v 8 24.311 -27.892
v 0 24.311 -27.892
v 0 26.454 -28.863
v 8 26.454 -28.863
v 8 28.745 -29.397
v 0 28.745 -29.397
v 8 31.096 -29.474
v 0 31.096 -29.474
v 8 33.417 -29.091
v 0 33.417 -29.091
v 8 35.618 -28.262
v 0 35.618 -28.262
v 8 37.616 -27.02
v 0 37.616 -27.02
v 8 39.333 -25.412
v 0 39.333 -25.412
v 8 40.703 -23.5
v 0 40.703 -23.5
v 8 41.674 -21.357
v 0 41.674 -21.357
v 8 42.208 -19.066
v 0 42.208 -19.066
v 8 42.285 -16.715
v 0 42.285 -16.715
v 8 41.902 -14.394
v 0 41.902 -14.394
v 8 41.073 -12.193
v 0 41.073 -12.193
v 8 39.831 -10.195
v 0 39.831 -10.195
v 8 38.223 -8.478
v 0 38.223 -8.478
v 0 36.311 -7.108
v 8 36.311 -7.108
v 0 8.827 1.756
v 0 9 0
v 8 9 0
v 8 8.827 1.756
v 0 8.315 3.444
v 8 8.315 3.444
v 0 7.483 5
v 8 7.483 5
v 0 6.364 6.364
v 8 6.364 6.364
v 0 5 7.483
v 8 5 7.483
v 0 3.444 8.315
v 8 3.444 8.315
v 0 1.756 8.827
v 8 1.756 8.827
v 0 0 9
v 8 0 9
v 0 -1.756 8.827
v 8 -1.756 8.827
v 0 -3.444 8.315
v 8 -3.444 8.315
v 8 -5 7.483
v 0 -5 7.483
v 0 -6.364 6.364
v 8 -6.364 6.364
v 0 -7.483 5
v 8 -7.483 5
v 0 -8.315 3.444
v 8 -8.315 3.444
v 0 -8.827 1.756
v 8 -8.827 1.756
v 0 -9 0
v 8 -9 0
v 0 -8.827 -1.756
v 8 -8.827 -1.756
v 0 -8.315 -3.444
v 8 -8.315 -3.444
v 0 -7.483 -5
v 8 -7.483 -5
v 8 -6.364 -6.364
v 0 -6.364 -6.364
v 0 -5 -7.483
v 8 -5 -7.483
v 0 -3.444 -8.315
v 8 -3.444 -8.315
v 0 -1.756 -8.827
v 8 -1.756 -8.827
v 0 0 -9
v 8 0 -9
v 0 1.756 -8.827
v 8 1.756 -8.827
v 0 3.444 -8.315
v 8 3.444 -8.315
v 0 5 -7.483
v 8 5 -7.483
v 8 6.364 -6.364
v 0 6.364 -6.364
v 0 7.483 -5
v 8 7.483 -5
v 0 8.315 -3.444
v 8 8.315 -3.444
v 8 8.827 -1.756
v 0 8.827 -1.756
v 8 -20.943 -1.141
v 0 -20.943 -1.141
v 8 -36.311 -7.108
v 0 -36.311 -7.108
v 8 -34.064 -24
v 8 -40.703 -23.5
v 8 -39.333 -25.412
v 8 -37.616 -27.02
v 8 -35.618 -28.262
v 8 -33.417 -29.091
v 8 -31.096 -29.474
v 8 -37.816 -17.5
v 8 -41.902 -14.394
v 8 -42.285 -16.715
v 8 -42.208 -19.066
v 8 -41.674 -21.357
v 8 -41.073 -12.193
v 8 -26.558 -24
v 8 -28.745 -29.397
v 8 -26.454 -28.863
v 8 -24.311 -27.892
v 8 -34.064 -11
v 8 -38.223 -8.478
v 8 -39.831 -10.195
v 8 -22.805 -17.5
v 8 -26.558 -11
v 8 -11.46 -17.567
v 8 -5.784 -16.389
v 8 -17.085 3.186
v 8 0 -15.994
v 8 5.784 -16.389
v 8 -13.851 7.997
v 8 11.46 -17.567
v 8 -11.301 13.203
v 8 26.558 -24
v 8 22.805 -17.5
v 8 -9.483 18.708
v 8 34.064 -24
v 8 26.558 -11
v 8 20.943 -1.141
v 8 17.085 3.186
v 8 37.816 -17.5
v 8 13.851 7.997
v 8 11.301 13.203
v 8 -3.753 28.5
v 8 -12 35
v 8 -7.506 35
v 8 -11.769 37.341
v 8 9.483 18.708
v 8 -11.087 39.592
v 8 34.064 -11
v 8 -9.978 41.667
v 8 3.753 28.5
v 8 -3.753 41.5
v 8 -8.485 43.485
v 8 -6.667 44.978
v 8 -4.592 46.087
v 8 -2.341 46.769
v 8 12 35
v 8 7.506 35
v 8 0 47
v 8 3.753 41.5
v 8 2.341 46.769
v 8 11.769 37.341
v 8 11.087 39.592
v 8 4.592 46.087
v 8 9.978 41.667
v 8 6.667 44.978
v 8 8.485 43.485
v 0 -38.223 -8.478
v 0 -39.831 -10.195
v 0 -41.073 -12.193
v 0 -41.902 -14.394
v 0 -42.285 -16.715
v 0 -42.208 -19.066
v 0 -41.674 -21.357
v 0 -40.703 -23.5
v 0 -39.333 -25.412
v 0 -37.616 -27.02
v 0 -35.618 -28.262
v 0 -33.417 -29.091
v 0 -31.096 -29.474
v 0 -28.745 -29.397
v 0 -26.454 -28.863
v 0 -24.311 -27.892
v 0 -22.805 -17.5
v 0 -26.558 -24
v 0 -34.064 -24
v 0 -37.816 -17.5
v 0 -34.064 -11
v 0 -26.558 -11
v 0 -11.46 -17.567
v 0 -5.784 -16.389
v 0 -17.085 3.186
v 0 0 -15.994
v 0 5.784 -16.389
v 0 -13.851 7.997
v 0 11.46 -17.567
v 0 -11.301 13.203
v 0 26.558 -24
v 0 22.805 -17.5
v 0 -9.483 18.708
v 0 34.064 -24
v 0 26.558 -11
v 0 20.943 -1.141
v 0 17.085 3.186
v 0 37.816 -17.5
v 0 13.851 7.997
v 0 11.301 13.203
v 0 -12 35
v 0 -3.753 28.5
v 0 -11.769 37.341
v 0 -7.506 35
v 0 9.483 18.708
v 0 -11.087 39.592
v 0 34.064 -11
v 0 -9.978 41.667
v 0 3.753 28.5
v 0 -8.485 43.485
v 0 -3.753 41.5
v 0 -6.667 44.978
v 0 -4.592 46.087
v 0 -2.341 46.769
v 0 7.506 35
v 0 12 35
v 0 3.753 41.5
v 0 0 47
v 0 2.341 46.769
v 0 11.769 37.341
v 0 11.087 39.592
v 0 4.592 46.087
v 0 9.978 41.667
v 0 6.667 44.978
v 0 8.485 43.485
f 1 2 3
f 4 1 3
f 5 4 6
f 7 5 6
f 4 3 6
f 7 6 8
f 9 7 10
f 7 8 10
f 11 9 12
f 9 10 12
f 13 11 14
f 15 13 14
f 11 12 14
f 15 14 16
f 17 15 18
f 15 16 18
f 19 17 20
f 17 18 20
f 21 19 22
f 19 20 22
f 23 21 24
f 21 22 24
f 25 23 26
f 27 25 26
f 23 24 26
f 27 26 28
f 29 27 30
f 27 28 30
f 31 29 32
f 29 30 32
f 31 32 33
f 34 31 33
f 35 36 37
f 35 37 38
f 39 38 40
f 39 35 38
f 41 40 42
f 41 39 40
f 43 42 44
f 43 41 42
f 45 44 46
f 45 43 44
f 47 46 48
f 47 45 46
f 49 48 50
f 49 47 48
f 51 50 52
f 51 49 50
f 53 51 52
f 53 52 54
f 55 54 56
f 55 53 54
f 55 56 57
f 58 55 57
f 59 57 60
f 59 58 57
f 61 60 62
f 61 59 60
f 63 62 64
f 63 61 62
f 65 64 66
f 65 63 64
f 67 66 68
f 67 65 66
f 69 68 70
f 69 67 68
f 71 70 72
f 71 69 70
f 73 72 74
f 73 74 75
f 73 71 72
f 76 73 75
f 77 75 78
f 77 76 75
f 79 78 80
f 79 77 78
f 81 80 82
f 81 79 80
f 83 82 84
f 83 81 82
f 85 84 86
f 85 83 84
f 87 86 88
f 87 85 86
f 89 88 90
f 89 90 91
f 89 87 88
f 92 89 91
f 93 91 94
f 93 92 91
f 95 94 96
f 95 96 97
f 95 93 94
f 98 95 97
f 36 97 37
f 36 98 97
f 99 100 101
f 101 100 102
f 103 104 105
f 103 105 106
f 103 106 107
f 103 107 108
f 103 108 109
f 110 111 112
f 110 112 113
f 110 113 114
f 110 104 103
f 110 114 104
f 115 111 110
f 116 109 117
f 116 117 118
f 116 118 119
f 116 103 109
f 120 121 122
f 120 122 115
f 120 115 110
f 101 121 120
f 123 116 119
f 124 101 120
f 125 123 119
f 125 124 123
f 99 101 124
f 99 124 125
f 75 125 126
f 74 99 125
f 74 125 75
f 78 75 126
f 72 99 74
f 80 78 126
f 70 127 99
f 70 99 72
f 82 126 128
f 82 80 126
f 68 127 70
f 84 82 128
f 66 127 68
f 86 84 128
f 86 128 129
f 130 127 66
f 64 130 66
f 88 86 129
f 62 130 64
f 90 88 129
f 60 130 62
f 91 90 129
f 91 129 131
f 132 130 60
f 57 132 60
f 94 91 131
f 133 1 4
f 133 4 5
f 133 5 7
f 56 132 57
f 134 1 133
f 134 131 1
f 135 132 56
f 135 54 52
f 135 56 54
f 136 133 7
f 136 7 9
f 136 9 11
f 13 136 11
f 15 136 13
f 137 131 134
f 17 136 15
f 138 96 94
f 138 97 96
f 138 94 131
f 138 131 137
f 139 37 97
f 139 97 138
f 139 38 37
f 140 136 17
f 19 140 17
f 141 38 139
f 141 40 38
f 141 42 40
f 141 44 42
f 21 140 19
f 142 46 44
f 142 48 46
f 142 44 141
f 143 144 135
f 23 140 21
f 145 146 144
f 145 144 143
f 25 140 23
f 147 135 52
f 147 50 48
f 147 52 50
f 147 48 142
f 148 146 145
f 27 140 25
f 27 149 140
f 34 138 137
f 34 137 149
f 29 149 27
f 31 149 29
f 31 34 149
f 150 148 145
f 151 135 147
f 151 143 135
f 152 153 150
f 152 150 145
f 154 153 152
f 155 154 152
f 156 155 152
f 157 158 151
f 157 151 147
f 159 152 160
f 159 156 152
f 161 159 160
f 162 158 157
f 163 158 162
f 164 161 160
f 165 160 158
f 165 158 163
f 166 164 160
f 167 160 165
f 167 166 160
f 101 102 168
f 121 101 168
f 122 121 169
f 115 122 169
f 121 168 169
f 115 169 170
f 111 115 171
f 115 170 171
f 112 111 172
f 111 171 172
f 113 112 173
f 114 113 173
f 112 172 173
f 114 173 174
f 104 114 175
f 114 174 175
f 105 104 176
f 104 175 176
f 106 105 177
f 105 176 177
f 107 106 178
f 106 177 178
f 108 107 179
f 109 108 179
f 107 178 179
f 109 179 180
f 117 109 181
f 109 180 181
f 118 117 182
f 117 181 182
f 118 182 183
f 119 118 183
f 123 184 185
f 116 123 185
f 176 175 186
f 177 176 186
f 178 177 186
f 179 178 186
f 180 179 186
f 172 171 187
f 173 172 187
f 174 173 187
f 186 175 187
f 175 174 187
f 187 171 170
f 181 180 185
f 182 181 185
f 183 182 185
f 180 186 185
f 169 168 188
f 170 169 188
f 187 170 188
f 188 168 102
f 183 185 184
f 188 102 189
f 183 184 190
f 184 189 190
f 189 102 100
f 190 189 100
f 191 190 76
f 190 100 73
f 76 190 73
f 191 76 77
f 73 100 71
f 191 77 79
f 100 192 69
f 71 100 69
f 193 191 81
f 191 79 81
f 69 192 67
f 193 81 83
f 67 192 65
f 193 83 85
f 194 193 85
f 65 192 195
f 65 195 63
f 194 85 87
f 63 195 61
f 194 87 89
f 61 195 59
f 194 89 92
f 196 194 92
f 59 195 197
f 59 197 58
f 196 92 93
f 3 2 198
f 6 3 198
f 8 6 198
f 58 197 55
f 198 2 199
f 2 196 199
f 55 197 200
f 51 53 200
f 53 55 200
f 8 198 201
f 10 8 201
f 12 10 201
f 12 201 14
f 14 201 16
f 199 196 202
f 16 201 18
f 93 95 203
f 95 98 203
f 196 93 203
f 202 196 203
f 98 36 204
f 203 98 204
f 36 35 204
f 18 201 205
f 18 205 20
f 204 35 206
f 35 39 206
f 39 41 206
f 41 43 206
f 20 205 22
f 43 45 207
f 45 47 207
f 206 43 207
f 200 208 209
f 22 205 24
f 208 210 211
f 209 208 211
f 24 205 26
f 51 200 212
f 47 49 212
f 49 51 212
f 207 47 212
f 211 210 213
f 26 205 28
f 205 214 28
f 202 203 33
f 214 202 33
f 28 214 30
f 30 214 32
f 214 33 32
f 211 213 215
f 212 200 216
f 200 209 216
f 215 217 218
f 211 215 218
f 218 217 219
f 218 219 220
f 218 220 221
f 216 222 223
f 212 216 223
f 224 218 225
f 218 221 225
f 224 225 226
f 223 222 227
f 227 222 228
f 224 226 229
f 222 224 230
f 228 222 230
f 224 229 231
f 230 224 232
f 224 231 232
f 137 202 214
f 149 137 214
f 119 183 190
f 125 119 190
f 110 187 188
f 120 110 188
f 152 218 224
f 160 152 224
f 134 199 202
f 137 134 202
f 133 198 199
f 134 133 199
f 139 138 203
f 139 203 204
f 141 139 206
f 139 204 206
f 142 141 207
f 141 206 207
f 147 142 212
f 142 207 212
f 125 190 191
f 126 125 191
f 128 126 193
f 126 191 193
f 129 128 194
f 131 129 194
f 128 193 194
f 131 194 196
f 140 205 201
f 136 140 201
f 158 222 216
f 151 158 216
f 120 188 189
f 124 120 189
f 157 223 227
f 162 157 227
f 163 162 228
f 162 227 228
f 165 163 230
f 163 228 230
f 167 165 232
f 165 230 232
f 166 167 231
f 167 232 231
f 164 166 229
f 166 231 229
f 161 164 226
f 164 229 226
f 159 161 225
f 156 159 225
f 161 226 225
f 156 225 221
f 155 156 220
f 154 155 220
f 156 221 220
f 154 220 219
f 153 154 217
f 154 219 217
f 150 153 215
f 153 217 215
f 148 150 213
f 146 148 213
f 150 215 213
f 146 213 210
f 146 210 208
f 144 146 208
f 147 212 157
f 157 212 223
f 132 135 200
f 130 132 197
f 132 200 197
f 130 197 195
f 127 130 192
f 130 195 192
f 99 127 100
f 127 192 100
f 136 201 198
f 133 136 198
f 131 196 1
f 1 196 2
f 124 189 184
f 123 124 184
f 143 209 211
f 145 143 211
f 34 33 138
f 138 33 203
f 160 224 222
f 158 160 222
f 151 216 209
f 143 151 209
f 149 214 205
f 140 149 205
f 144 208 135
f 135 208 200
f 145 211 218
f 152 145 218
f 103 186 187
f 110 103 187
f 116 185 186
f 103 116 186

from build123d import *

# Parameters (mm, degrees)
F0_R     = 9
F1_DEPTH = 8


with BuildPart() as f1:
    # F0 (on Right) → F1 (new body)
    with BuildSketch(Plane.YZ):
        with BuildLine():
            Line((9.482996, 18.707991), (12, 35))
            ThreePointArc((12, 35), (0, 47), (-12, 35))
            Line((-12, 35), (-9.482996, 18.707991))
            ThreePointArc((-9.482996, 18.707991), (-13.851316, 7.997061), (-20.943094, -1.14148))
            Line((-20.943094, -1.14148), (-36.310889, -7.107695))
            ThreePointArc((-36.310889, -7.107695), (-40.703194, -23.5), (-24.310889, -27.892305))
            Line((-24.310889, -27.892305), (-11.460098, -17.566512))
            ThreePointArc((-11.460098, -17.566512), (0, -15.994123), (11.460098, -17.566512))
            Line((11.460098, -17.566512), (24.310889, -27.892305))
            ThreePointArc((24.310889, -27.892305), (40.703194, -23.5), (36.310889, -7.107695))
            Line((36.310889, -7.107695), (20.943094, -1.14148))
            ThreePointArc((20.943094, -1.14148), (13.851316, 7.997061), (9.482996, 18.707991))
        make_face()
        Polygon((-26.558112, -11), (-22.805336, -17.5), (-26.558112, -24), (-34.063666, -24), (-37.816443, -17.5), (-34.063666, -11), align=None, mode=Mode.SUBTRACT)
        Polygon((22.805336, -17.5), (26.558112, -11), (34.063666, -11), (37.816443, -17.5), (34.063666, -24), (26.558112, -24), align=None, mode=Mode.SUBTRACT)
        Circle(F0_R, mode=Mode.SUBTRACT)
        Polygon((7.505553, 35), (3.752777, 28.5), (-3.752777, 28.5), (-7.505553, 35), (-3.752777, 41.5), (3.752777, 41.5), align=None, mode=Mode.SUBTRACT)
    extrude(amount=F1_DEPTH)


solid = f1.part
